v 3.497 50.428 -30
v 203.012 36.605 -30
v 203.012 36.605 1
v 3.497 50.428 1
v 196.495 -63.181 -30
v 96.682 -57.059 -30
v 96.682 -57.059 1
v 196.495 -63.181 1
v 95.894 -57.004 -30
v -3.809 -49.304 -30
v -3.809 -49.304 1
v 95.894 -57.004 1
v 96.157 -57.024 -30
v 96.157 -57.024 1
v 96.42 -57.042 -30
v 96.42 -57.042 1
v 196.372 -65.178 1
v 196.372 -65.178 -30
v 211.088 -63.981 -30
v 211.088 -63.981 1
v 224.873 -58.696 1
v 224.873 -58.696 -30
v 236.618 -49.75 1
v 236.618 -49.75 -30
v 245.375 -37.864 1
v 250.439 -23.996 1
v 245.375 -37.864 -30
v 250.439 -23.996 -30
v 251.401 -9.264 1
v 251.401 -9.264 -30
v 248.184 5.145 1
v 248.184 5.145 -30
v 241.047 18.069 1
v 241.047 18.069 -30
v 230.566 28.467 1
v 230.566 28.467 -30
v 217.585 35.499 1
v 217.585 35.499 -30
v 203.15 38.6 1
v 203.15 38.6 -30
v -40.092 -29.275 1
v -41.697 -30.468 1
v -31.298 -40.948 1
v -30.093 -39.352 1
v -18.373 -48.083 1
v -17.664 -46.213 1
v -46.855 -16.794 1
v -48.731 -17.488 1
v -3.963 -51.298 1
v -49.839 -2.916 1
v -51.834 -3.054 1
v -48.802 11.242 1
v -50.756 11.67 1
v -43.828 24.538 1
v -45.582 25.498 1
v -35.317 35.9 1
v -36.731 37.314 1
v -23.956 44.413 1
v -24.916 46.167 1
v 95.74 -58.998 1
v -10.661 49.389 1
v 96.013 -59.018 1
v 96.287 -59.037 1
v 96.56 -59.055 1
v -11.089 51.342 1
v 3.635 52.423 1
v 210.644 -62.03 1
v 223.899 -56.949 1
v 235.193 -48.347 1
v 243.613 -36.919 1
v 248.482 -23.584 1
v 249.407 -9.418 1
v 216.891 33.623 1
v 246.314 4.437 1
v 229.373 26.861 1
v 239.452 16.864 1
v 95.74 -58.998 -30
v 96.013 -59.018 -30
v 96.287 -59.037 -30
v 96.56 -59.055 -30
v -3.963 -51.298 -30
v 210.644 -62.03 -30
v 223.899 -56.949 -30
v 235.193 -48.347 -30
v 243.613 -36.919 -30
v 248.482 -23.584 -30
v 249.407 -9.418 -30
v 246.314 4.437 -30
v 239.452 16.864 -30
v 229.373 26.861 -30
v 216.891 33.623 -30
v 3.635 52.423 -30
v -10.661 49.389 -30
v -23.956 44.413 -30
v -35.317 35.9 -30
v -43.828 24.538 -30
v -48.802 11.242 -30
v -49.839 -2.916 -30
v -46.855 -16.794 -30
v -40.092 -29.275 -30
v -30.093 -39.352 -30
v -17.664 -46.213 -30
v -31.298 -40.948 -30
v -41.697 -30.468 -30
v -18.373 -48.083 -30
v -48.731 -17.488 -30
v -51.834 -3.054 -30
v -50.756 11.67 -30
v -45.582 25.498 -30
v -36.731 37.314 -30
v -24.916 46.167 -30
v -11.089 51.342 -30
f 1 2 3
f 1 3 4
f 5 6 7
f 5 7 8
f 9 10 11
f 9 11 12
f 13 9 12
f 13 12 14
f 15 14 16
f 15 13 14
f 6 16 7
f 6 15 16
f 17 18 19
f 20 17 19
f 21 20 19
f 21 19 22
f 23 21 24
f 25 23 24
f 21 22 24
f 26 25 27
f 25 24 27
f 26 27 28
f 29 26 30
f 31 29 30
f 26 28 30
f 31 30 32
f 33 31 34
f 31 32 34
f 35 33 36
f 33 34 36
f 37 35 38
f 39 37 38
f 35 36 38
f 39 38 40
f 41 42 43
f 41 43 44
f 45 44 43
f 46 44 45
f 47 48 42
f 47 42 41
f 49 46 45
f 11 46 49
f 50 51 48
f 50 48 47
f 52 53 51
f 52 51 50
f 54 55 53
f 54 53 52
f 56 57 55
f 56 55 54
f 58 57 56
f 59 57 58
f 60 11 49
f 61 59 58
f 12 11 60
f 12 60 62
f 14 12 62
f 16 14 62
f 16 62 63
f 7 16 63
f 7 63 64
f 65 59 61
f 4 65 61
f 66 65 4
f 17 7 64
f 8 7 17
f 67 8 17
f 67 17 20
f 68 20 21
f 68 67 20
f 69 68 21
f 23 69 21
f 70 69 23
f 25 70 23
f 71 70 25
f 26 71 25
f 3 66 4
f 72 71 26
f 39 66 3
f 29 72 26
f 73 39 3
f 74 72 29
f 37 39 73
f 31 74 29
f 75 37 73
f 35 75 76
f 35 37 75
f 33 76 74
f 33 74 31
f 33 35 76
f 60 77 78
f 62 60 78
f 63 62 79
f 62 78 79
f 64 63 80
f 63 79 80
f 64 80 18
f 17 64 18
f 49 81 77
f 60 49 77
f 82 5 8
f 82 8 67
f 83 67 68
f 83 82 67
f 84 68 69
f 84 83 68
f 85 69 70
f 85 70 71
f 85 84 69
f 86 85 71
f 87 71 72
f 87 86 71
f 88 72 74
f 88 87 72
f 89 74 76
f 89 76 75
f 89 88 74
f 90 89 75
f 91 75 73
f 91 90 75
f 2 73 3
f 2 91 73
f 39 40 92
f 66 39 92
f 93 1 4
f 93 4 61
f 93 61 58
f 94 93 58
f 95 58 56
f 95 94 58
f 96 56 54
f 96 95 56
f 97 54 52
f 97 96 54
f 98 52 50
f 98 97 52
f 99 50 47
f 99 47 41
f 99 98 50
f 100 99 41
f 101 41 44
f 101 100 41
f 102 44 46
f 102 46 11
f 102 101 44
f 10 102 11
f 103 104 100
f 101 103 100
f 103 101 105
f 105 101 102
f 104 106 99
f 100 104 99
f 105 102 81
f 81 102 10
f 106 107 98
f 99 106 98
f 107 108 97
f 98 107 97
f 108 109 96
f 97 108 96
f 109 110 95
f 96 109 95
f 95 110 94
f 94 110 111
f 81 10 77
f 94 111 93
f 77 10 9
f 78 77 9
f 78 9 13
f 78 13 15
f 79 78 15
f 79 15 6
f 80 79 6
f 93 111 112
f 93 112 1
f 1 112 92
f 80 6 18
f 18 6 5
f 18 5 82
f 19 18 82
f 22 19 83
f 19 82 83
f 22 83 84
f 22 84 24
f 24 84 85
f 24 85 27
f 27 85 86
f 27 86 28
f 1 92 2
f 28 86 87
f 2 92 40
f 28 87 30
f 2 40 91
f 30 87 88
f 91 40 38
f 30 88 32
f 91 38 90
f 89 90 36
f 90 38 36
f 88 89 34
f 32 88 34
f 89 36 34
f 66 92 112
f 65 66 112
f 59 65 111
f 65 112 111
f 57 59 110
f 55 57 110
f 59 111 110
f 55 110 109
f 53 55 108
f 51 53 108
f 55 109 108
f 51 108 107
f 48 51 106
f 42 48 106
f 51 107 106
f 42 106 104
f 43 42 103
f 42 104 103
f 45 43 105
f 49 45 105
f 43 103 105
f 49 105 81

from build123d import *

# Parameters (mm, degrees)
EXTRUDE_THIN2_DEPTH      = 1
EXTRUDE_THIN2_DEPTH_BACK = 30


with BuildPart() as part:
    # Sketch2 → Extrude-Thin2 (new, two sides: drawn at the far end of the back side and taken through both)
    with BuildSketch(Plane.XY.offset(-EXTRUDE_THIN2_DEPTH_BACK)):
        with BuildLine():
            Line((203.150311833, 38.600349755), (3.634824321, 52.423187112))
            ThreePointArc((3.634824321, 52.423187112), (-51.820262836, 4.346595446), (-3.963228019, -51.298077043))
            Line((-3.963228019, -51.298077043), (95.739880914, -58.998081537))
            ThreePointArc((95.739880914, -58.998081537), (96.149833249, -59.028112402), (96.560010162, -59.054901754))
            Line((96.560010162, -59.054901754), (196.372388742, -65.177734616))
            ThreePointArc((196.372388742, -65.177734616), (251.445709315, -16.664285771), (203.150311833, 38.600349755))
        make_face()
        with BuildLine():
            Line((203.01207914, 36.605132543), (3.496591628, 50.4279699))
            ThreePointArc((3.496591628, 50.4279699), (-49.82560756, 4.200477913), (-3.809227929, -49.304014864))
            Line((-3.809227929, -49.304014864), (95.893881004, -57.004019358))
            ThreePointArc((95.893881004, -57.004019358), (96.288065941, -57.03289519), (96.68246682, -57.058654182))
            Line((96.68246682, -57.058654182), (196.494845399, -63.181487045))
            ThreePointArc((196.494845399, -63.181487045), (249.449961335, -16.533940078), (203.01207914, 36.605132543))
        make_face(mode=Mode.SUBTRACT)
    extrude(amount=EXTRUDE_THIN2_DEPTH + EXTRUDE_THIN2_DEPTH_BACK)


solid = part.part
